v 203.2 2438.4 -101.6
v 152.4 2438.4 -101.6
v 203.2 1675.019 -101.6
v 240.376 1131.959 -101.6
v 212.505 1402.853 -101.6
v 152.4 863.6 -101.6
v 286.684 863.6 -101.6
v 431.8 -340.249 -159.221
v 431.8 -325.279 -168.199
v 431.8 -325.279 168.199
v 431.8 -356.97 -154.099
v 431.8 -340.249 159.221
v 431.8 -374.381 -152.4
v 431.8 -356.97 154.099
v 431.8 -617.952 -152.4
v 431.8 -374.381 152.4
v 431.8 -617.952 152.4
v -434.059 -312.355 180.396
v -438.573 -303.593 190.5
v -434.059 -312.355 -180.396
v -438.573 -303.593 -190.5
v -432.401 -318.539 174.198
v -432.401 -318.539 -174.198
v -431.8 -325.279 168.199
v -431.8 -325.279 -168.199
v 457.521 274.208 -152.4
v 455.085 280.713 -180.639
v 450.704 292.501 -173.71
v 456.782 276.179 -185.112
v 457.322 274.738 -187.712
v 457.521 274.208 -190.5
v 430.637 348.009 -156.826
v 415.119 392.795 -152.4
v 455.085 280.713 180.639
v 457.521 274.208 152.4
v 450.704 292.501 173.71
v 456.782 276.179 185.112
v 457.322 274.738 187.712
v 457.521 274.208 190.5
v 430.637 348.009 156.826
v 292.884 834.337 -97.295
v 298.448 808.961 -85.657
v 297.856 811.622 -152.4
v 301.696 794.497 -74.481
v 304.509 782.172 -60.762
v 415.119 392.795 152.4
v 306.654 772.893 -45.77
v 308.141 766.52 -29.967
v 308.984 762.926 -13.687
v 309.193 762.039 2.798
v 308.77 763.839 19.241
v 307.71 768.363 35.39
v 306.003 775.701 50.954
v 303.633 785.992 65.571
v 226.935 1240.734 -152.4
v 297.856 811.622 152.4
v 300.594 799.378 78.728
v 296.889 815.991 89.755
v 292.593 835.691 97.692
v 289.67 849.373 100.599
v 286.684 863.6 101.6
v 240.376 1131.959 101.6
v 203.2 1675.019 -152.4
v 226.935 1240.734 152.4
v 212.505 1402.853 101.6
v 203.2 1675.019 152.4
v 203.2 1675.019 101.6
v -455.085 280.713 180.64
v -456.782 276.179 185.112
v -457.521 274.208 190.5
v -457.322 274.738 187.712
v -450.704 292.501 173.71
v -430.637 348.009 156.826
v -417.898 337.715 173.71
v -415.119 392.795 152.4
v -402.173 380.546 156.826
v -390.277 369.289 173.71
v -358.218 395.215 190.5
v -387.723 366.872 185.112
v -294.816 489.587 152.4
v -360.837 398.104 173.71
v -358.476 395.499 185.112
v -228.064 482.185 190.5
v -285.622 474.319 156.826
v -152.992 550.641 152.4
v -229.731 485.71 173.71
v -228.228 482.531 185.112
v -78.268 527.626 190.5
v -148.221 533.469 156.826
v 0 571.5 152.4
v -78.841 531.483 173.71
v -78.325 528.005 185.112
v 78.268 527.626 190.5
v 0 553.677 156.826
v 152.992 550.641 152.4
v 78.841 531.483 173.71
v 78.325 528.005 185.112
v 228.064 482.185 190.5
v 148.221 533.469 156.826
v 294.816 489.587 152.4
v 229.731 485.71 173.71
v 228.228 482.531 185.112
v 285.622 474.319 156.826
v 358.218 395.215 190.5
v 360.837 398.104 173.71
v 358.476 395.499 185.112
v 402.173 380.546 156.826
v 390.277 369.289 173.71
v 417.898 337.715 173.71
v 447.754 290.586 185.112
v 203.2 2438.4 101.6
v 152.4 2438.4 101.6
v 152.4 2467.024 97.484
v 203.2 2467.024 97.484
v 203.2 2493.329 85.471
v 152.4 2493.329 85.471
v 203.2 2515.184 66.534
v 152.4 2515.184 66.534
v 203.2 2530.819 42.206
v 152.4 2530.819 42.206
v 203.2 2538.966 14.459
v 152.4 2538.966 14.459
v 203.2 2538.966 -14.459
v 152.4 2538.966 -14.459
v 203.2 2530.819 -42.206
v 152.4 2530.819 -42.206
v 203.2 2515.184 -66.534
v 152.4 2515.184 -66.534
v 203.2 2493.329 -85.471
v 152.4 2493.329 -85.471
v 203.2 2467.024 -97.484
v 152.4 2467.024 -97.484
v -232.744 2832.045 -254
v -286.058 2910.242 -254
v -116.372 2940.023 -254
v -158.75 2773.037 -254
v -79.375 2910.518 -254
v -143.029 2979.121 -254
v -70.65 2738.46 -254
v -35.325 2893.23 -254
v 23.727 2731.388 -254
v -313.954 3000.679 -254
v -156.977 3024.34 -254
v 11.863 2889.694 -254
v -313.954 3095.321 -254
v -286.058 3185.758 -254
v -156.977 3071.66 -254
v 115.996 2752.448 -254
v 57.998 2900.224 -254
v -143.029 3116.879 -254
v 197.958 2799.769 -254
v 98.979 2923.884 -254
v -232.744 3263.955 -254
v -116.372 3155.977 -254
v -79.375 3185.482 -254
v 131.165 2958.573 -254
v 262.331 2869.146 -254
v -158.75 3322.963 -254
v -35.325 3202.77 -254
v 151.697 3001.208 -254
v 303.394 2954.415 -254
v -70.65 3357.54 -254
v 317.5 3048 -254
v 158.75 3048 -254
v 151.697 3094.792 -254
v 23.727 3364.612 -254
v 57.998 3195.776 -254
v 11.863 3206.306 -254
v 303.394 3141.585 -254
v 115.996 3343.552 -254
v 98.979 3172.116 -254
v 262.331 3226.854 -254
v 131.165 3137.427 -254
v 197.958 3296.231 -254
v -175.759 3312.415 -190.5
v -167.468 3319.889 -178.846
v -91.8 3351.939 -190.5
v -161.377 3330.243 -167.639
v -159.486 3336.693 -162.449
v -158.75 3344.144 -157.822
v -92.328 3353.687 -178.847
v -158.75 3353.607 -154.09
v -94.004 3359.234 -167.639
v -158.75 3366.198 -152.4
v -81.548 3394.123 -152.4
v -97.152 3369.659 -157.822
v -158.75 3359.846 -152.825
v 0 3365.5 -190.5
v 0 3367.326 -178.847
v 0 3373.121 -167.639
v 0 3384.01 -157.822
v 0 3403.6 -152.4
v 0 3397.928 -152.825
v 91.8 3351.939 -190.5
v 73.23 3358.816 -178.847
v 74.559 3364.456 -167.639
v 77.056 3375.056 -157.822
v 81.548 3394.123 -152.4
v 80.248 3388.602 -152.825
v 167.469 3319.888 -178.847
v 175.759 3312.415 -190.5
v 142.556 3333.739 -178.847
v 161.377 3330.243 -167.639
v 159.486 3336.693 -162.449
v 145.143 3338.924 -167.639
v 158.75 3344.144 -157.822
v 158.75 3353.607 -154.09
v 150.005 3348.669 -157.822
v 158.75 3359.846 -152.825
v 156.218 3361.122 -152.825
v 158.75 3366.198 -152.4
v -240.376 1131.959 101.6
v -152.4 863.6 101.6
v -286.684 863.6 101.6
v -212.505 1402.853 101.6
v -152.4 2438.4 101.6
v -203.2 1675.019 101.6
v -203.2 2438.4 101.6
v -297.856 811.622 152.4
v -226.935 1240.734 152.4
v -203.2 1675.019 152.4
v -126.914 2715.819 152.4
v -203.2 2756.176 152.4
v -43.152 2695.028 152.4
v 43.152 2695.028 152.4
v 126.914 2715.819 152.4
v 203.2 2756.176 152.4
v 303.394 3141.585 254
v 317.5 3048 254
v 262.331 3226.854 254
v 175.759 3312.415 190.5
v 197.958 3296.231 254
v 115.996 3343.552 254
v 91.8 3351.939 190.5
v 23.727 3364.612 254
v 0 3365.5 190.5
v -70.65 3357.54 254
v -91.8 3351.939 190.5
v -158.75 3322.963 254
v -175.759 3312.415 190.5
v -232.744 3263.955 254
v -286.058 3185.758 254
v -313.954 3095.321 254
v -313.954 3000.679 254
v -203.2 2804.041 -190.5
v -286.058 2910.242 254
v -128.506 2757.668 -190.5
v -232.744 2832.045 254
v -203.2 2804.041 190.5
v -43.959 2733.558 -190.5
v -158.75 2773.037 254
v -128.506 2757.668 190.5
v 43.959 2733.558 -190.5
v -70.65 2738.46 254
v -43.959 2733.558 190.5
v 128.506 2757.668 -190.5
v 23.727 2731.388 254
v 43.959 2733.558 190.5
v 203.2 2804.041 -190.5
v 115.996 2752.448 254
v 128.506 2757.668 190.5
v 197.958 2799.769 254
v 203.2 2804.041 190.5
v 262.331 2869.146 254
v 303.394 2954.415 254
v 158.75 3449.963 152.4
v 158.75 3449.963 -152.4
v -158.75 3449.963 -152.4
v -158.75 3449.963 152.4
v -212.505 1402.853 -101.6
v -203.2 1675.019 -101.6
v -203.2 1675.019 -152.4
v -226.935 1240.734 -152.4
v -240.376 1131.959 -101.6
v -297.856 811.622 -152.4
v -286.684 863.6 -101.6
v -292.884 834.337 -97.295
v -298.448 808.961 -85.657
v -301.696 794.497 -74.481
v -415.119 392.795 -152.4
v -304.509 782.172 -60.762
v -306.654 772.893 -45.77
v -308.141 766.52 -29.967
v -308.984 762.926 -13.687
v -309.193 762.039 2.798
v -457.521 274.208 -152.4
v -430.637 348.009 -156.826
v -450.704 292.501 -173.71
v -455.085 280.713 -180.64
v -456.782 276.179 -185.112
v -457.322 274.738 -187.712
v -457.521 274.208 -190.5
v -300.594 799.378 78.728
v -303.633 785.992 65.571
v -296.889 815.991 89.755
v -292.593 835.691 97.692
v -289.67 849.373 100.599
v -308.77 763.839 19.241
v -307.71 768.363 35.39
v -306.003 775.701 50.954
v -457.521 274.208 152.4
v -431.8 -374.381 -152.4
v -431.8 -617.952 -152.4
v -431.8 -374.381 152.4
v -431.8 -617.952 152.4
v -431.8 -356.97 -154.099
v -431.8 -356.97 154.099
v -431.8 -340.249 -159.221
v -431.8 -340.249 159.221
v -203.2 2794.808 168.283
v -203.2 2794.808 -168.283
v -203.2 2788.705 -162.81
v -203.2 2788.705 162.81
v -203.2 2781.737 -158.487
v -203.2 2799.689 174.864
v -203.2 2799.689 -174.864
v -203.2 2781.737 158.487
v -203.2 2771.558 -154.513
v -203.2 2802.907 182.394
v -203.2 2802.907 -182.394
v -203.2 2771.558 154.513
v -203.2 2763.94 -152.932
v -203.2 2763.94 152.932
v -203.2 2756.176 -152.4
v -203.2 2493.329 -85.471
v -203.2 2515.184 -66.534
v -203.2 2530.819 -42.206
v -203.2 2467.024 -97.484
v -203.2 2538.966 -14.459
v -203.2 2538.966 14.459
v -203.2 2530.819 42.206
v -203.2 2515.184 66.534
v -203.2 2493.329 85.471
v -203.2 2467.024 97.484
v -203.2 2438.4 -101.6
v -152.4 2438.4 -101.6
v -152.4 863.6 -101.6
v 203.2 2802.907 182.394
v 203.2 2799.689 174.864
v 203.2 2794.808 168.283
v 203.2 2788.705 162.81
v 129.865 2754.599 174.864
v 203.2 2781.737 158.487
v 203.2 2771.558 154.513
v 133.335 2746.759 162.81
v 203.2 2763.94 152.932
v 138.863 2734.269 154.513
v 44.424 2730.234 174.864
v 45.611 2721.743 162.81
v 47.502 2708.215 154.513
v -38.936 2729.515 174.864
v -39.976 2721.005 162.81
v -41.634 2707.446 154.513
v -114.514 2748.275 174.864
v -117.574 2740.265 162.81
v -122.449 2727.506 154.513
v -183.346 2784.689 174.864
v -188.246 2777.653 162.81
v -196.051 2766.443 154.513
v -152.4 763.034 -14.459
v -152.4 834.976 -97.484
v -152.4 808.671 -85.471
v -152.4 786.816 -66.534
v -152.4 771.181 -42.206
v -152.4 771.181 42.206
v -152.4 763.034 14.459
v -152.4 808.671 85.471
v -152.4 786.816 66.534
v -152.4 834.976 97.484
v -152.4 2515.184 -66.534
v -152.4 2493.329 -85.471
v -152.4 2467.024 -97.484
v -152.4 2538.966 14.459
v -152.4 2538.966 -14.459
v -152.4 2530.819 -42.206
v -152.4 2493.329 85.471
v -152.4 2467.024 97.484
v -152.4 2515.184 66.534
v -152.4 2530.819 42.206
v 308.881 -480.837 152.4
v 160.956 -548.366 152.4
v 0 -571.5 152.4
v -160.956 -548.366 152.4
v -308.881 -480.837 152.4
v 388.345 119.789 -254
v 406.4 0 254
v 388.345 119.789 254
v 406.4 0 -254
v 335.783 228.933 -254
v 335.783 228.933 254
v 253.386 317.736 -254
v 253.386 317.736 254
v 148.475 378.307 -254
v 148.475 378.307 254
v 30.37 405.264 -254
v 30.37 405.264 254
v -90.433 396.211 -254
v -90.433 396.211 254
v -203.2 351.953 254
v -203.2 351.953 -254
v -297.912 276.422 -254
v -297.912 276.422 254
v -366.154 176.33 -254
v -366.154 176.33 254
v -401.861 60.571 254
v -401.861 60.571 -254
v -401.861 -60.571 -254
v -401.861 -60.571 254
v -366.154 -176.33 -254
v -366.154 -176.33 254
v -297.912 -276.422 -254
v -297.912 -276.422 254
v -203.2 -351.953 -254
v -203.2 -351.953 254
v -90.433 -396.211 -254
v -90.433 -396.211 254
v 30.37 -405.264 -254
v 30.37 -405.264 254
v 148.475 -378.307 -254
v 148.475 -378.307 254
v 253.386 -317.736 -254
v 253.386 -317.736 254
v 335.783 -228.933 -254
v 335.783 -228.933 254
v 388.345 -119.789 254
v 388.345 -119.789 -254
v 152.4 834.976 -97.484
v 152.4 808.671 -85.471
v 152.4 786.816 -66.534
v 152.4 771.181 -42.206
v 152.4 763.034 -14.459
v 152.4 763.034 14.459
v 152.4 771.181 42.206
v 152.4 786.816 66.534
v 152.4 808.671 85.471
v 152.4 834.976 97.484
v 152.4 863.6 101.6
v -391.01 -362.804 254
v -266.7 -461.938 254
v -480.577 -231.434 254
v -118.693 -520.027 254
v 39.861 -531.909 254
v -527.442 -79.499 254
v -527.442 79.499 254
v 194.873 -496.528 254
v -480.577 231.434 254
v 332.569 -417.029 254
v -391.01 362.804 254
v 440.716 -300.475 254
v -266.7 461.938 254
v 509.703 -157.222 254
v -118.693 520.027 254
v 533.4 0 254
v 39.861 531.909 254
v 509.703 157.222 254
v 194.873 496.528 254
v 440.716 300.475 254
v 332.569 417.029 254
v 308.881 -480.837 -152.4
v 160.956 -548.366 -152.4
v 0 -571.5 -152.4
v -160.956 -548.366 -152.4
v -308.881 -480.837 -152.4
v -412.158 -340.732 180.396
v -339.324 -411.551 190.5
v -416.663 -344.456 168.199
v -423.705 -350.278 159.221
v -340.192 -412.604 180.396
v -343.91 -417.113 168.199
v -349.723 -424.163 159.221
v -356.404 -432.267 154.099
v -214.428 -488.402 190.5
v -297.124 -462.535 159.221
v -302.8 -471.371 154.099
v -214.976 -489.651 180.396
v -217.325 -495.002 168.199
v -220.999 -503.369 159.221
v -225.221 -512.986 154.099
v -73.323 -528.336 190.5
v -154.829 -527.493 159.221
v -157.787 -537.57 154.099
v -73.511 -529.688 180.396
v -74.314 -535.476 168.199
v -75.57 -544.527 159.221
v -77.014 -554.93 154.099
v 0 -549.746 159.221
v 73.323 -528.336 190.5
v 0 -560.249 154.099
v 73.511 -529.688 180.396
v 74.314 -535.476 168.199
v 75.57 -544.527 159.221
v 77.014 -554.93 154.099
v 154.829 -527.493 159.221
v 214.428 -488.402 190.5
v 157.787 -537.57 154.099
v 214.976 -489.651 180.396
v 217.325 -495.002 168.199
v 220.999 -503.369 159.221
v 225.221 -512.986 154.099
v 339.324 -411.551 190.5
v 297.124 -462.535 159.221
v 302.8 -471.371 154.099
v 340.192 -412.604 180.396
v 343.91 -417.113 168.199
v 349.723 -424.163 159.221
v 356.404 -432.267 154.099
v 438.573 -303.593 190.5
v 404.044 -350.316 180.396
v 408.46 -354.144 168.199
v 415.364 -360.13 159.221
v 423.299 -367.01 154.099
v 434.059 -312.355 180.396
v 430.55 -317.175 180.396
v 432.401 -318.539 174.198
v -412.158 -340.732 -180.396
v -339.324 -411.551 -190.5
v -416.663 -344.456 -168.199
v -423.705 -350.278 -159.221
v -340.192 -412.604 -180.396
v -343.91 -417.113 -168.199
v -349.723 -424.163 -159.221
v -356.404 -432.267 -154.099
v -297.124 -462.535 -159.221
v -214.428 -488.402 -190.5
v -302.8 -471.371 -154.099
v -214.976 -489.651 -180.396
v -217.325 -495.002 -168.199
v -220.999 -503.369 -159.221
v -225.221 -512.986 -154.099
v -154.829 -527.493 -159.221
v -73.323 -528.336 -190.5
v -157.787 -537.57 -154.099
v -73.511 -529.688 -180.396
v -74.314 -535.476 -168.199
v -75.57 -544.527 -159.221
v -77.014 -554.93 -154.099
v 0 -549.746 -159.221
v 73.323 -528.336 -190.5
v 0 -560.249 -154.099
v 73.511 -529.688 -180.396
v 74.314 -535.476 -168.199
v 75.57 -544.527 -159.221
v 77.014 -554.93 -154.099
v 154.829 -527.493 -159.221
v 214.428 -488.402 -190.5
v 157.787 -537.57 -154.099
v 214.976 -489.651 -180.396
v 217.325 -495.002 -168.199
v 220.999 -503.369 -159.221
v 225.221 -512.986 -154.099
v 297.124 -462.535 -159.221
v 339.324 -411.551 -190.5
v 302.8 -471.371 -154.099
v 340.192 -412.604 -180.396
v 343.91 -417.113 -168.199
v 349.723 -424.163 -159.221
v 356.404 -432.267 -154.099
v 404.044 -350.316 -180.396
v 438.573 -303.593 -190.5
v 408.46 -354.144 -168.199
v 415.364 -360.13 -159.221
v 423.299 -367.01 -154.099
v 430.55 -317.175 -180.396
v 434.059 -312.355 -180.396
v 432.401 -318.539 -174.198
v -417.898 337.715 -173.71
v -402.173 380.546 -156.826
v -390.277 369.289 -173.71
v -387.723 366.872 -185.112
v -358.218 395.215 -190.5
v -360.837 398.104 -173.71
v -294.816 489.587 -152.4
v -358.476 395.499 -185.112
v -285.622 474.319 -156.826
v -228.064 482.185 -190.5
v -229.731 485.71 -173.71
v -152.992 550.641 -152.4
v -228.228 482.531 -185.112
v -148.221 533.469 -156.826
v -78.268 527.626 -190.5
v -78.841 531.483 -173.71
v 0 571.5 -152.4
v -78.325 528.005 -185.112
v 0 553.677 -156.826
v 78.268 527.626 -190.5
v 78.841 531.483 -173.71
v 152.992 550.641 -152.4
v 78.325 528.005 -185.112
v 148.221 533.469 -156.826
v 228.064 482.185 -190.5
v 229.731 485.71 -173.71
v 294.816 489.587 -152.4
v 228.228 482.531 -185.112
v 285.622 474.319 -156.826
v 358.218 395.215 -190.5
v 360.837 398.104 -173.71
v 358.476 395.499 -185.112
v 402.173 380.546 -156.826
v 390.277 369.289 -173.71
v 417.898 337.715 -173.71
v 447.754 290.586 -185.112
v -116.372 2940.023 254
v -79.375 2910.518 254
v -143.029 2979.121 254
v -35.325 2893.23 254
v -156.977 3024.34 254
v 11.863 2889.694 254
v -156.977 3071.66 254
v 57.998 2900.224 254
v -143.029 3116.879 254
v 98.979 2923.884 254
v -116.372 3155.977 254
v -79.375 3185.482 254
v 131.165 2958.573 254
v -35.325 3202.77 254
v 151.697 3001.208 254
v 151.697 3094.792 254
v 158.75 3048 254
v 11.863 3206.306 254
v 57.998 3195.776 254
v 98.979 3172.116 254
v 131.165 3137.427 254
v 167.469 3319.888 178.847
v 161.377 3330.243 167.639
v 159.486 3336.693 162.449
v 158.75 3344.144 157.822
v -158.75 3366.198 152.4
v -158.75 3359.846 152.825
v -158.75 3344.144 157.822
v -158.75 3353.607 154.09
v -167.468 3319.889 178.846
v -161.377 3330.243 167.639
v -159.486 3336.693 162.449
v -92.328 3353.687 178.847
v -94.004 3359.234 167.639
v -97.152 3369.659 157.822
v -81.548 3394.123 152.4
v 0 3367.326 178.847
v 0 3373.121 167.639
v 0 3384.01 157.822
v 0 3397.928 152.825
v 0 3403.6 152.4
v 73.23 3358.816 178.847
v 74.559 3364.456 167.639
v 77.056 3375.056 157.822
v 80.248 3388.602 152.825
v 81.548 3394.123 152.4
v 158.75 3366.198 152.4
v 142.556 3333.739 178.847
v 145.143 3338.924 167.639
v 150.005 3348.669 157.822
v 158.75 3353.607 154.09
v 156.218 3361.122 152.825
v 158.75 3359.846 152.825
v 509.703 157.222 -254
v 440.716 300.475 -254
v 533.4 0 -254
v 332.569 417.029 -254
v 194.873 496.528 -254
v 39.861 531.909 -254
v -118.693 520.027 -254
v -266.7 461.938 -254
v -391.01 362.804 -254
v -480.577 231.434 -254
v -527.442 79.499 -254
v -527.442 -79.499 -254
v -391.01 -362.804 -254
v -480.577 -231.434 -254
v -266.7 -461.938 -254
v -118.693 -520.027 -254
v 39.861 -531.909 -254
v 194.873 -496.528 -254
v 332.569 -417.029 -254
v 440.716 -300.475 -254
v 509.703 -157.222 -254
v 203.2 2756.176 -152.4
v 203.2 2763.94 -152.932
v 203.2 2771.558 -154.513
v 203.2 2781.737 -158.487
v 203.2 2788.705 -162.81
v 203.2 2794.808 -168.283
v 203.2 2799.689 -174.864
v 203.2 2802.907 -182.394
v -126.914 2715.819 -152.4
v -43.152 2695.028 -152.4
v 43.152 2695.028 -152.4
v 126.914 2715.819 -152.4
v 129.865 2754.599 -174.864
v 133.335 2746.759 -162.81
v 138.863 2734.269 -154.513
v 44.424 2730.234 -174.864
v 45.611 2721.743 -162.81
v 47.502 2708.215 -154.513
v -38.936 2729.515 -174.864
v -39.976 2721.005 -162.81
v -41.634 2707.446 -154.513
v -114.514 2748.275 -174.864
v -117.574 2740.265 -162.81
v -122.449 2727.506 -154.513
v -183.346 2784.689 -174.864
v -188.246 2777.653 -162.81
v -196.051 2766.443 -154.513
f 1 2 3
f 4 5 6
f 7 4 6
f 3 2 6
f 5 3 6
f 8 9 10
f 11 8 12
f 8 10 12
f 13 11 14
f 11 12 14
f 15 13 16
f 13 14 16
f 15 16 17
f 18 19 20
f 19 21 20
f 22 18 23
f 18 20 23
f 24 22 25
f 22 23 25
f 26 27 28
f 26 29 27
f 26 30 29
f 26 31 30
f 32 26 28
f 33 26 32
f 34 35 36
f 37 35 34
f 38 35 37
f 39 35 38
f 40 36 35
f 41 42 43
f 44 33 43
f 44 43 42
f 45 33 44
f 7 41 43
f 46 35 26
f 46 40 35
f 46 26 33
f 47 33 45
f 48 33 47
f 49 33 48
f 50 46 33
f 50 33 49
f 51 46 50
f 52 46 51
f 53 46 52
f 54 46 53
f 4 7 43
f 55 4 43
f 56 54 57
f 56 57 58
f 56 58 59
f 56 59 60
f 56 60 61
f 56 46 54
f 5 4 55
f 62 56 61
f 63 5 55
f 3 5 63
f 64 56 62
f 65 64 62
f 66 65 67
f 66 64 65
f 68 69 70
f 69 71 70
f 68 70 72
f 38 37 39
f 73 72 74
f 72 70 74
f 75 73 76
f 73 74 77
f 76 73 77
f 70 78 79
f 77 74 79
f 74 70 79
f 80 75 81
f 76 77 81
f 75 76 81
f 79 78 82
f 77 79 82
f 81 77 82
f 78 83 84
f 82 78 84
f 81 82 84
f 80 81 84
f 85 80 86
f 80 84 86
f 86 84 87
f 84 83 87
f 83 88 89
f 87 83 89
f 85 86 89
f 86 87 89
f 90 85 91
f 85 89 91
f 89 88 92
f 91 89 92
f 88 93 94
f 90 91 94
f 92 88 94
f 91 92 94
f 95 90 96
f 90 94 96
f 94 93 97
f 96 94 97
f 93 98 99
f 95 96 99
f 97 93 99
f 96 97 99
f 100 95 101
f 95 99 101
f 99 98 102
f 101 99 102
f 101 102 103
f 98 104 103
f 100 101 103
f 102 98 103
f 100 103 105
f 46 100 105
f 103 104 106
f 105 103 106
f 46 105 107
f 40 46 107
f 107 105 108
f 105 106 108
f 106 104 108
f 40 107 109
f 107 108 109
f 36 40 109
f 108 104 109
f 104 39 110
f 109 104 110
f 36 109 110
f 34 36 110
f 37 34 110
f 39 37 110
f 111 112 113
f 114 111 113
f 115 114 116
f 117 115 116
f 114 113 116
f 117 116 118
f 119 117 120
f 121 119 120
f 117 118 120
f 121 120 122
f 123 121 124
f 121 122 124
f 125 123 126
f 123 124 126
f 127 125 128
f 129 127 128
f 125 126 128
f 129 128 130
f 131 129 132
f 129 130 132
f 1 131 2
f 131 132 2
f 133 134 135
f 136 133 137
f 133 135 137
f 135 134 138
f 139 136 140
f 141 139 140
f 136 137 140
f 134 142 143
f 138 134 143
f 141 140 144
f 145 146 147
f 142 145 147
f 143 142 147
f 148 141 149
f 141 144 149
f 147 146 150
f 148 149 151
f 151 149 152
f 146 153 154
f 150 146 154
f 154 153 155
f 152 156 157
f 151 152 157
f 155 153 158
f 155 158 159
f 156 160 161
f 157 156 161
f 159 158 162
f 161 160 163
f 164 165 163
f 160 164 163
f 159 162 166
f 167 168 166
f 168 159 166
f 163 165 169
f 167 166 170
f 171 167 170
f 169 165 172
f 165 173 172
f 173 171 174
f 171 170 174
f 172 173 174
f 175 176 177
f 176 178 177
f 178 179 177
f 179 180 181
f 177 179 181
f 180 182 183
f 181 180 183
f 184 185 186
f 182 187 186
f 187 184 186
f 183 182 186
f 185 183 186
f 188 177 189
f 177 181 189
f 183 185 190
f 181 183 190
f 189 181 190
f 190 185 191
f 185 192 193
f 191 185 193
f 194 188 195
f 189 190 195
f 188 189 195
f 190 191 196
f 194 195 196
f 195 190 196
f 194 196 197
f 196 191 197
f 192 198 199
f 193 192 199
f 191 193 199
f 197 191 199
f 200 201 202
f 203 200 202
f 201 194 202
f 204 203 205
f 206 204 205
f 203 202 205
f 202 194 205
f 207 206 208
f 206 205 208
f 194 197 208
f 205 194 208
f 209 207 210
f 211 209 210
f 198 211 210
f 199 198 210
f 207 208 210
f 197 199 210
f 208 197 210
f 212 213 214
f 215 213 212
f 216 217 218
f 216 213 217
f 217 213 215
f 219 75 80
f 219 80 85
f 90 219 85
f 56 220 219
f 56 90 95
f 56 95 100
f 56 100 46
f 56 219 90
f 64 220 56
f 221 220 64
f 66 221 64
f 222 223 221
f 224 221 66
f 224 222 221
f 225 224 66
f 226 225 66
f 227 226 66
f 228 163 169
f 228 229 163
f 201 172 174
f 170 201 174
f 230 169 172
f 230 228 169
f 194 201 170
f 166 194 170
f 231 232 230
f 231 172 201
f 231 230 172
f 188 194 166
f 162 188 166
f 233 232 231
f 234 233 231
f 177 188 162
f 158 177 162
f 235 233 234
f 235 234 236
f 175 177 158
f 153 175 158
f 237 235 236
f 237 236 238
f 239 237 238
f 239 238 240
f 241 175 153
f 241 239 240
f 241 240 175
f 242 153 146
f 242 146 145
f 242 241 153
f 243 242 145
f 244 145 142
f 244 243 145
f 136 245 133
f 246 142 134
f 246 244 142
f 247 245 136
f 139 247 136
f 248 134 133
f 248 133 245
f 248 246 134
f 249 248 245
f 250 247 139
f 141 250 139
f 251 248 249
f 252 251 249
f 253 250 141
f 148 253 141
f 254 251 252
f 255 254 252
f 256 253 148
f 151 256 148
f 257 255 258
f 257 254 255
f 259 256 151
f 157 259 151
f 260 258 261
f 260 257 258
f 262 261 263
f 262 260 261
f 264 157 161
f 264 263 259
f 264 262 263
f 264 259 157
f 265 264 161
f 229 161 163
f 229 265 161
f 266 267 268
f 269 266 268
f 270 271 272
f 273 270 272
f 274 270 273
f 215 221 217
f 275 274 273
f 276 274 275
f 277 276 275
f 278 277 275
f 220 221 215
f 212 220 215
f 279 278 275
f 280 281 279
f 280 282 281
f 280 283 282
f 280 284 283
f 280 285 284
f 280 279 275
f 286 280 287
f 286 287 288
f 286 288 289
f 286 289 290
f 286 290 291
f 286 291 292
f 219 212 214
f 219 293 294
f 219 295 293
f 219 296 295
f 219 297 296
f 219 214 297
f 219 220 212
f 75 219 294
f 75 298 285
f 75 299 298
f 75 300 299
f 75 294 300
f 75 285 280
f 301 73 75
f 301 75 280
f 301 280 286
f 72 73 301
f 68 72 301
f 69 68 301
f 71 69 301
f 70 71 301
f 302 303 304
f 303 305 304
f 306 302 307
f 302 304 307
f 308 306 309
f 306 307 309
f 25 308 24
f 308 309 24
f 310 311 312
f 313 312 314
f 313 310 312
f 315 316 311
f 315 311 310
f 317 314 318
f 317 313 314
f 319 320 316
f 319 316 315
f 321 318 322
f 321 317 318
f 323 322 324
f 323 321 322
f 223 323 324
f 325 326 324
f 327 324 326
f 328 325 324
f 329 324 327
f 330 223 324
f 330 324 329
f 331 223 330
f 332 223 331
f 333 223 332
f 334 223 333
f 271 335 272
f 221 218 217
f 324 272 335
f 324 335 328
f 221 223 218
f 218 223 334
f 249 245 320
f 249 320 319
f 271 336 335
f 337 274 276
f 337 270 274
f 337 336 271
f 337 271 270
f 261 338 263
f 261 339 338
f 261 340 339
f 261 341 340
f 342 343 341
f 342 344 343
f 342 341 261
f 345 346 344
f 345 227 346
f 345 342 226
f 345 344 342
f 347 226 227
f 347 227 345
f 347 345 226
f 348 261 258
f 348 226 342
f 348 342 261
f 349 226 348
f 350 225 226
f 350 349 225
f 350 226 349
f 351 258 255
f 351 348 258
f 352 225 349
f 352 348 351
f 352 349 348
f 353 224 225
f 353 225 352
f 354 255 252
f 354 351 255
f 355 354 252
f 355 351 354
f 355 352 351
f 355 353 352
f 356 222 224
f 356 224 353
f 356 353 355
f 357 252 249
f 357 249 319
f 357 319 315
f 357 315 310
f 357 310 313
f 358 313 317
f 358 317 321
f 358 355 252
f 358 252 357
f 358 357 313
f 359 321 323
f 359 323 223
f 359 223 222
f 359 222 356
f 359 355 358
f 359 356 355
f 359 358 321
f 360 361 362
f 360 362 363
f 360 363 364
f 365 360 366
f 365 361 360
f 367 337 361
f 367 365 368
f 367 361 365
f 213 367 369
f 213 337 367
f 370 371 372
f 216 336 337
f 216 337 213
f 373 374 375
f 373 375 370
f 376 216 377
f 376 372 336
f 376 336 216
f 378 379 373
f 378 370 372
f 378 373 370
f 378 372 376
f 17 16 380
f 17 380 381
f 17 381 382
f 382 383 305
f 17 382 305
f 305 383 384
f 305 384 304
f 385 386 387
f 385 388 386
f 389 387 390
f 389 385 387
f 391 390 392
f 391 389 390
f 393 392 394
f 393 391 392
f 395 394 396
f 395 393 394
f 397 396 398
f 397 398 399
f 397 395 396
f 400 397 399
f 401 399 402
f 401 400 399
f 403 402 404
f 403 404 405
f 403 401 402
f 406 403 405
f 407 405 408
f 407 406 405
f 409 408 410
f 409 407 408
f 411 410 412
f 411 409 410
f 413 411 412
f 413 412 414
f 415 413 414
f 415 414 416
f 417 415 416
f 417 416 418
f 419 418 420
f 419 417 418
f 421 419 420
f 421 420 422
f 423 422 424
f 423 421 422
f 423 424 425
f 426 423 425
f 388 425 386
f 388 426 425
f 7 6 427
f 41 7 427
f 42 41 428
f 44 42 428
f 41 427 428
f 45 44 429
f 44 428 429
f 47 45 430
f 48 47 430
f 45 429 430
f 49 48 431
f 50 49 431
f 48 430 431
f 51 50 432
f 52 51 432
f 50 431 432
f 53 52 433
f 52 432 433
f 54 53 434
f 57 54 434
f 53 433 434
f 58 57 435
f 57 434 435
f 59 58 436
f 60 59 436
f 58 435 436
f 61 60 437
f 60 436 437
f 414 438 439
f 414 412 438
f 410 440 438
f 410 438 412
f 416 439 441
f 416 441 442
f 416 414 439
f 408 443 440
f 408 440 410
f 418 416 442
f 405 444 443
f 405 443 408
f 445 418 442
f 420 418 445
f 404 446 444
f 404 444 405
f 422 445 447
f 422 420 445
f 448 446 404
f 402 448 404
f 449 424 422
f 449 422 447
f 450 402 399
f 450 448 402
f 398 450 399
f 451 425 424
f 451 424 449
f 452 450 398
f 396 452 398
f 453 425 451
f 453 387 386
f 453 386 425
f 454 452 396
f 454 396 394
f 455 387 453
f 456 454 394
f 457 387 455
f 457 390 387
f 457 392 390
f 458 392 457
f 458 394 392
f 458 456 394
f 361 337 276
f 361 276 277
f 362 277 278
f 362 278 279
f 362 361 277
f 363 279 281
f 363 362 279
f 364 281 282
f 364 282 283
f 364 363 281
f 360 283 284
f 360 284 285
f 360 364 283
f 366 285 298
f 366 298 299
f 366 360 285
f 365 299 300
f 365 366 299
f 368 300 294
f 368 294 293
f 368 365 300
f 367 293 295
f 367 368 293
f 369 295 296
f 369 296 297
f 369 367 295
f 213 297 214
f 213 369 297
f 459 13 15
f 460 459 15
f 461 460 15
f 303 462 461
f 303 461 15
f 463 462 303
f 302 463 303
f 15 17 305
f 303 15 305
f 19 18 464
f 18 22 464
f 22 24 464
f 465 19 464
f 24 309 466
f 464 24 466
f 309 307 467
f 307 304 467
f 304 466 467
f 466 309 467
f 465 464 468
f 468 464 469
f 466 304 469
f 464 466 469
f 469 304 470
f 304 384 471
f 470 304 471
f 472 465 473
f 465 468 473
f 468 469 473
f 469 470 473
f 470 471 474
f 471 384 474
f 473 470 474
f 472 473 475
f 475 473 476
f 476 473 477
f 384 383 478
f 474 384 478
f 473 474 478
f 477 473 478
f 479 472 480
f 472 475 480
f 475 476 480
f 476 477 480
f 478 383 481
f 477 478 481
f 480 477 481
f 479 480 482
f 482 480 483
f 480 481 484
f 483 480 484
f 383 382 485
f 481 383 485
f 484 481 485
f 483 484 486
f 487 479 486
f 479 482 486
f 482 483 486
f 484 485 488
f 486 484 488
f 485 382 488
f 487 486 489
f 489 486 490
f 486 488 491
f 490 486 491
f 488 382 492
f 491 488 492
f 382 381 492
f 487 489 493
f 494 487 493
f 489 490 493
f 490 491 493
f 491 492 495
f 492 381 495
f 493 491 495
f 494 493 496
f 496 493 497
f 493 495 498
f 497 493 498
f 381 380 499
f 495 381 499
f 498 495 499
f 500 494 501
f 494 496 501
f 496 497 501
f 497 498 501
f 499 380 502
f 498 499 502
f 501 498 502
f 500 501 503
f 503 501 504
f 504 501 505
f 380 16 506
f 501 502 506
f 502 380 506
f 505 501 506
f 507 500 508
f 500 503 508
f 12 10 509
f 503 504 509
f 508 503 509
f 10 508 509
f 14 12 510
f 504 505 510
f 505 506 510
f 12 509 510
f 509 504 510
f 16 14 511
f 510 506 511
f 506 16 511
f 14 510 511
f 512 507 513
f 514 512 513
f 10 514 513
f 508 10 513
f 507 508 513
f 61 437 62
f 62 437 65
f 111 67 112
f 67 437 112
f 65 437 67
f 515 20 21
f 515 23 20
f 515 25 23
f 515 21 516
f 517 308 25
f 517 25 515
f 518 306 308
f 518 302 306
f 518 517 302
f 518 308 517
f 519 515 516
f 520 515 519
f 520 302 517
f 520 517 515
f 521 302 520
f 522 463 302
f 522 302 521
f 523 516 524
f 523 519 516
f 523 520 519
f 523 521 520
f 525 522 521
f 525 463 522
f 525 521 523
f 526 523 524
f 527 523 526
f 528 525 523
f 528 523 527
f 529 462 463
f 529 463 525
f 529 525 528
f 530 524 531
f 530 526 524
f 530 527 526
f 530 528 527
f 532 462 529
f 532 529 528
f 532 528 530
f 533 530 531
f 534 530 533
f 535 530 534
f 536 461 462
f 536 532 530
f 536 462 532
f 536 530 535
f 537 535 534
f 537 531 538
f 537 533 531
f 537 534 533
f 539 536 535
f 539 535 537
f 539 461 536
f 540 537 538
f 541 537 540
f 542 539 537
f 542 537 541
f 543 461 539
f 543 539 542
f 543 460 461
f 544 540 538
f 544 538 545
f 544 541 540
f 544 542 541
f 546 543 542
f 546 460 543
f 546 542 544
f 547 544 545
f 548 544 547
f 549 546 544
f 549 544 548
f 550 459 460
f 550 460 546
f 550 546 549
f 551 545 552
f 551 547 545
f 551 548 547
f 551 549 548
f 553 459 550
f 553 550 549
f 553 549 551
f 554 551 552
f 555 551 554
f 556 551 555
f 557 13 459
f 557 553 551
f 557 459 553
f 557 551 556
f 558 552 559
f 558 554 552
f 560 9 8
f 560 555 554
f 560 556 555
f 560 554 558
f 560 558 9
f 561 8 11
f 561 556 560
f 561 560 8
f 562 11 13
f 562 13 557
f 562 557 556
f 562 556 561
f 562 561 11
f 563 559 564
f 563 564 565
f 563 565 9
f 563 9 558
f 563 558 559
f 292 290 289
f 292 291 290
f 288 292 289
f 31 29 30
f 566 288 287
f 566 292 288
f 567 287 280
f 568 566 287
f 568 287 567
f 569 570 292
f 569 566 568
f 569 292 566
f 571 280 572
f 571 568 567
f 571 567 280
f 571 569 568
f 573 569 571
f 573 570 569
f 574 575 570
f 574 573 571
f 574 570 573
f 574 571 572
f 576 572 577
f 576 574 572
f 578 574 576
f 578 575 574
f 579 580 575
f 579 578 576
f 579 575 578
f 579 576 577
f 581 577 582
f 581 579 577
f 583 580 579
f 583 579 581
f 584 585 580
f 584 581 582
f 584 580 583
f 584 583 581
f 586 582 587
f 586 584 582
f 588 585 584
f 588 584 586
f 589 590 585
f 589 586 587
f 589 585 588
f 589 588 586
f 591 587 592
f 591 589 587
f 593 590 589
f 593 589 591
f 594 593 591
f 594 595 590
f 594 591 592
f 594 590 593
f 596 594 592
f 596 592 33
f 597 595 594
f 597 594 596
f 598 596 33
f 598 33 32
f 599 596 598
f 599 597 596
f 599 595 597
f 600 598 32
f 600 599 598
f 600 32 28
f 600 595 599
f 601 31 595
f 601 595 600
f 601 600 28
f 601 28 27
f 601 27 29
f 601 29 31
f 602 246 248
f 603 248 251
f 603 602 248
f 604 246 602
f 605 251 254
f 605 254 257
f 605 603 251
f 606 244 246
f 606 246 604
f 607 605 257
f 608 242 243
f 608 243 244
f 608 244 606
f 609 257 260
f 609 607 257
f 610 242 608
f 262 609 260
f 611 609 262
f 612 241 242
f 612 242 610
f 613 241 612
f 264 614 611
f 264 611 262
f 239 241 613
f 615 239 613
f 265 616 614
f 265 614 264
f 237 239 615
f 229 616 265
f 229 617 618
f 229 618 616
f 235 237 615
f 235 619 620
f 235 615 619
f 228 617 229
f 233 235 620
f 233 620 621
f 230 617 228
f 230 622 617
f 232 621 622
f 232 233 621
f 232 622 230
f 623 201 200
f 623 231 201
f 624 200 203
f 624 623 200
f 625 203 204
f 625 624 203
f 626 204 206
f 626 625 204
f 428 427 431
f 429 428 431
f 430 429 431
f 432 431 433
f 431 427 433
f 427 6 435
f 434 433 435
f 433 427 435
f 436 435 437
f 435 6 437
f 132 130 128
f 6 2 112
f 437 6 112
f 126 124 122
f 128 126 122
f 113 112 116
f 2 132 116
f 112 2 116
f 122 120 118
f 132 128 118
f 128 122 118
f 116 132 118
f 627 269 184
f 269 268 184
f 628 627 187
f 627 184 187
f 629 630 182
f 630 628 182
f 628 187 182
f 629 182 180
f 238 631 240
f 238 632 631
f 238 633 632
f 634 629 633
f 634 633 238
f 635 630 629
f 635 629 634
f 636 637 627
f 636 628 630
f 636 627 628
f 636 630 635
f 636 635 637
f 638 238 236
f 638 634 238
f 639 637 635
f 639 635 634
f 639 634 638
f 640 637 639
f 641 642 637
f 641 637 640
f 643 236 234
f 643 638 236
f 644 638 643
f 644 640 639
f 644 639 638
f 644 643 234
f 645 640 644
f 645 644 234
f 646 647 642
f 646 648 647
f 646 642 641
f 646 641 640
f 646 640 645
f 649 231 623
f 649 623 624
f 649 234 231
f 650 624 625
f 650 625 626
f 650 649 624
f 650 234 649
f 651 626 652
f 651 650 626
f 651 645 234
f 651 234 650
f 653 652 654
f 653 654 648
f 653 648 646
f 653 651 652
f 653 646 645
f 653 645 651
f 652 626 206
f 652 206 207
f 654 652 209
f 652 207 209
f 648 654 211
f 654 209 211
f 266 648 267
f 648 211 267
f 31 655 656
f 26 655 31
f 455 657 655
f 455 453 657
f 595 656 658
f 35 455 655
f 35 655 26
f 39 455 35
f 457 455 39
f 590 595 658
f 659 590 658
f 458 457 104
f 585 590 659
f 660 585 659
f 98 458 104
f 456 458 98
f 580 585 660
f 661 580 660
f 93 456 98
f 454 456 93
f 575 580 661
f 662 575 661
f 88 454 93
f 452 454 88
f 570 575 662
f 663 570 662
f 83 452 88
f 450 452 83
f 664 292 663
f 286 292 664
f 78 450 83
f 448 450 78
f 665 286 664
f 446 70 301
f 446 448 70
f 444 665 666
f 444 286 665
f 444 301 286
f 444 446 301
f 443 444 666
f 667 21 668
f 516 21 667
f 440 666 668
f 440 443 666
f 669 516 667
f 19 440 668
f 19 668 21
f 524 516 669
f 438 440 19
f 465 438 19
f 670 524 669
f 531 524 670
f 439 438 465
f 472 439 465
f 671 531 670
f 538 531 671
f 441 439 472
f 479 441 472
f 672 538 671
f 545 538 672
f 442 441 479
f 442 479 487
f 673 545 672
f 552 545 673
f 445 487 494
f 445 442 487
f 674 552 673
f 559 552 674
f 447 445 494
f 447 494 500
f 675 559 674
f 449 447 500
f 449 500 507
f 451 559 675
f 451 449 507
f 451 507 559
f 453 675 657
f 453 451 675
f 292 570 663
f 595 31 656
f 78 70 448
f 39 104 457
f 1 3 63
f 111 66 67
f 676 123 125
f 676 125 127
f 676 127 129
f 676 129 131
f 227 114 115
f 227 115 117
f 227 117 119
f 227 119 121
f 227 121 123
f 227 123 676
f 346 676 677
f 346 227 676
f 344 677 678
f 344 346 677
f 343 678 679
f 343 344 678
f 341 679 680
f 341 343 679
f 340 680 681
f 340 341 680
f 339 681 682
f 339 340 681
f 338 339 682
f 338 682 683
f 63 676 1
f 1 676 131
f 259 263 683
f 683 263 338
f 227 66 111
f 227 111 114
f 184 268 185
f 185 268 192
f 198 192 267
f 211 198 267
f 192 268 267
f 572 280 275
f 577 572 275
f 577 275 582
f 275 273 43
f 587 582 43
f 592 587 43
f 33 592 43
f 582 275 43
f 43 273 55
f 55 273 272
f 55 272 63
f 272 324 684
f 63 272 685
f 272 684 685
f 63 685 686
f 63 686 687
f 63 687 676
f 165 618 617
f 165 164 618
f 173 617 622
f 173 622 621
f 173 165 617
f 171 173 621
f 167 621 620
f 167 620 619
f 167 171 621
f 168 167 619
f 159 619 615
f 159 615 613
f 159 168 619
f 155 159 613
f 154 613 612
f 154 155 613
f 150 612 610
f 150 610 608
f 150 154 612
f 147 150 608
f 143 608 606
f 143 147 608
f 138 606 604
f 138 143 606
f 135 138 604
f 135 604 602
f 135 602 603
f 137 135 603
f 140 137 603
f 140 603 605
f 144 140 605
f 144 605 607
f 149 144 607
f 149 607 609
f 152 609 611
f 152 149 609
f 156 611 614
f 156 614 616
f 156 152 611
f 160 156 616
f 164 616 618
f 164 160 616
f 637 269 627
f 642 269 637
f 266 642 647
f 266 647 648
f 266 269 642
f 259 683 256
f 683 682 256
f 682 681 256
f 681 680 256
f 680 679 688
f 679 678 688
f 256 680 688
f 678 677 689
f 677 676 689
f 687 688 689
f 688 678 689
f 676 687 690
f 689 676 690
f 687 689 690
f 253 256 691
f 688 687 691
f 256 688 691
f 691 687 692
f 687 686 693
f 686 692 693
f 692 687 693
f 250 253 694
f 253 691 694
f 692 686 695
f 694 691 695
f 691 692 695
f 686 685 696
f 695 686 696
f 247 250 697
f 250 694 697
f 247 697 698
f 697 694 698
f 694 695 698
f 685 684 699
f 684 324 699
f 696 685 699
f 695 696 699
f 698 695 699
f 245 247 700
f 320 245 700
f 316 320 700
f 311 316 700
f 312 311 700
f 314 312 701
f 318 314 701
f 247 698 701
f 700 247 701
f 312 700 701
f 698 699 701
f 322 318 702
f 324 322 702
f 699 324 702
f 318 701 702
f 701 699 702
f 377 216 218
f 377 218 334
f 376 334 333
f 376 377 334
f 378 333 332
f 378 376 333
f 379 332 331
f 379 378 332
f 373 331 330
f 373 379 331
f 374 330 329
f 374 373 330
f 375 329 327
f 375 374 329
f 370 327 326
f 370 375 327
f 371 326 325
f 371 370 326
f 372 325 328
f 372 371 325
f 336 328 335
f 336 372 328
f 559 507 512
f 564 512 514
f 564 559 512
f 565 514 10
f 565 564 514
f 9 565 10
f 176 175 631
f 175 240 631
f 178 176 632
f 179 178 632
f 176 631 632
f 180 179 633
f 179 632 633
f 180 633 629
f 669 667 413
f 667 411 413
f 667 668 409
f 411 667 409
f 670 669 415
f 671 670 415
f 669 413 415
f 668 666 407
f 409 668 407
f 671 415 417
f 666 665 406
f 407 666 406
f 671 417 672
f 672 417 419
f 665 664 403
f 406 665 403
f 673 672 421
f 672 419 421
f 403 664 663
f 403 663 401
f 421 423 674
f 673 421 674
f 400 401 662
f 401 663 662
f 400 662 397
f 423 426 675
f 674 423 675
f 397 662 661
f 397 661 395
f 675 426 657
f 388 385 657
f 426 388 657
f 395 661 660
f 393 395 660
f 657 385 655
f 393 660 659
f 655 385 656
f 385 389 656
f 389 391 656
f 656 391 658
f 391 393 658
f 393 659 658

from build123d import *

# Parameters (mm, degrees)
SKETCH1_R             = 533.4
SKETCH1_R_2           = 406.4
BOSS_EXTRUDE1_DEPTH   = 254
SKETCH1_R_3           = 317.5
SKETCH1_R_4           = 158.75
BOSS_EXTRUDE1_2_DEPTH = 254
BOSS_EXTRUDE3_DEPTH   = 152.4
BOSS_EXTRUDE4_DEPTH   = 152.4
FILLET1_R             = 38.1
FILLET2_R             = 38.1
FILLET3_R             = 38.1
CUT_EXTRUDE2_DEPTH    = 1331.976


with BuildPart() as part:
    # Sketch1 → Boss-Extrude1 (new body, symmetric)
    with BuildSketch(Plane.XY):
        Circle(SKETCH1_R)
        Circle(SKETCH1_R_2, mode=Mode.SUBTRACT)
    extrude(amount=BOSS_EXTRUDE1_DEPTH, both=True)



with BuildPart() as body_2:
    # Sketch1 → Boss-Extrude1 2 (new body, symmetric)
    with BuildSketch(Plane.XY):
        with Locations((0, 3048)):
            Circle(SKETCH1_R_3)
        with Locations((0, 3048)):
            Circle(SKETCH1_R_4, mode=Mode.SUBTRACT)
    extrude(amount=BOSS_EXTRUDE1_2_DEPTH, both=True)


with BuildPart() as part_1:
    add(part.part)

    add(body_2.part)  # Boss-Extrude3 merges body 2
    # Sketch3 → Boss-Extrude3 (add, symmetric)
    with BuildSketch(Plane.XY):
        with BuildLine():
            Line((203.2, 1675.01897356), (203.2, 2804.040966554))
            ThreePointArc((203.2, 2804.040966554), (0, 2730.5), (-203.2, 2804.040966554))
            Line((-203.2, 2804.040966554), (-203.2, 1675.01897356))
            ThreePointArc((-203.2, 1675.01897356), (-267.2957105, 963.163972593), (-457.520992032, 274.208136003))
            ThreePointArc((-457.520992032, 274.208136003), (0, 533.4), (457.520992032, 274.208136003))
            ThreePointArc((457.520992032, 274.208136003), (267.2957105, 963.163972593), (203.2, 1675.01897356))
        make_face()
    extrude(amount=BOSS_EXTRUDE3_DEPTH, both=True)

    # Sketch6 → Boss-Extrude4 (add, symmetric)
    with BuildSketch(Plane.XY):
        with BuildLine():
            Line((-158.75, 3449.963065702), (-158.75, 3322.963065702))
            ThreePointArc((-158.75, 3322.963065702), (0, 3365.5), (158.75, 3322.963065702))
            Line((158.75, 3322.963065702), (158.75, 3449.963065702))
            Line((158.75, 3449.963065702), (-158.75, 3449.963065702))
        make_face()
        with BuildLine():
            Line((-431.8, -617.952231351), (-431.8, -313.152231351))
            ThreePointArc((-431.8, -313.152231351), (0, -533.4), (431.8, -313.152231351))
            Line((431.8, -313.152231351), (431.8, -617.952231351))
            Line((431.8, -617.952231351), (-431.8, -617.952231351))
        make_face()
    extrude(amount=BOSS_EXTRUDE4_DEPTH, both=True)

    # Fillet1
    fillet1_edges = [part_1.edges().sort_by_distance(p)[0] for p in [
        (158.75, 3322.963065702, 0),
        (0, 3365.5, 152.4),
        (-158.75, 3322.963065702, 0),
        (0, 3365.5, -152.4),
    ]]
    fillet(fillet1_edges, radius=FILLET1_R)

    # Fillet2
    fillet2_edges = [part_1.edges().sort_by_distance(p)[0] for p in [
        (0, 2730.5, 152.4),
        (0, 533.4, 152.4),
        (0, 2730.5, -152.4),
        (0, 533.4, -152.4),
    ]]
    fillet(fillet2_edges, radius=FILLET2_R)

    # Fillet3
    fillet3_edges = [part_1.edges().sort_by_distance(p)[0] for p in [
        (-431.8, -313.152231351, 0),
        (0, -533.4, 152.4),
        (431.8, -313.152231351, 0),
        (0, -533.4, -152.4),
    ]]
    fillet(fillet3_edges, radius=FILLET3_R)

    # Sketch7 → Cut-Extrude2 (cut)
    with BuildSketch(Plane(origin=(152.4, 0, 0), x_dir=(0, 0, -1), z_dir=(1, 0, 0))):
        with BuildLine():
            Line((101.6, 2438.4), (101.6, 863.6))
            ThreePointArc((101.6, 863.6), (0, 762), (-101.6, 863.6))
            Line((-101.6, 863.6), (-101.6, 2438.4))
            ThreePointArc((-101.6, 2438.4), (0, 2540), (101.6, 2438.4))
        make_face()
    cut_extrude2 = extrude(amount=CUT_EXTRUDE2_DEPTH, mode=Mode.SUBTRACT)

    # Mirror1: Cut-Extrude2 across plane
    add(cut_extrude2.mirror(Plane(origin=(0, 0, 0), x_dir=(0, 0, 1), z_dir=(1, 0, 0))), mode=Mode.SUBTRACT)


solid = part_1.part
